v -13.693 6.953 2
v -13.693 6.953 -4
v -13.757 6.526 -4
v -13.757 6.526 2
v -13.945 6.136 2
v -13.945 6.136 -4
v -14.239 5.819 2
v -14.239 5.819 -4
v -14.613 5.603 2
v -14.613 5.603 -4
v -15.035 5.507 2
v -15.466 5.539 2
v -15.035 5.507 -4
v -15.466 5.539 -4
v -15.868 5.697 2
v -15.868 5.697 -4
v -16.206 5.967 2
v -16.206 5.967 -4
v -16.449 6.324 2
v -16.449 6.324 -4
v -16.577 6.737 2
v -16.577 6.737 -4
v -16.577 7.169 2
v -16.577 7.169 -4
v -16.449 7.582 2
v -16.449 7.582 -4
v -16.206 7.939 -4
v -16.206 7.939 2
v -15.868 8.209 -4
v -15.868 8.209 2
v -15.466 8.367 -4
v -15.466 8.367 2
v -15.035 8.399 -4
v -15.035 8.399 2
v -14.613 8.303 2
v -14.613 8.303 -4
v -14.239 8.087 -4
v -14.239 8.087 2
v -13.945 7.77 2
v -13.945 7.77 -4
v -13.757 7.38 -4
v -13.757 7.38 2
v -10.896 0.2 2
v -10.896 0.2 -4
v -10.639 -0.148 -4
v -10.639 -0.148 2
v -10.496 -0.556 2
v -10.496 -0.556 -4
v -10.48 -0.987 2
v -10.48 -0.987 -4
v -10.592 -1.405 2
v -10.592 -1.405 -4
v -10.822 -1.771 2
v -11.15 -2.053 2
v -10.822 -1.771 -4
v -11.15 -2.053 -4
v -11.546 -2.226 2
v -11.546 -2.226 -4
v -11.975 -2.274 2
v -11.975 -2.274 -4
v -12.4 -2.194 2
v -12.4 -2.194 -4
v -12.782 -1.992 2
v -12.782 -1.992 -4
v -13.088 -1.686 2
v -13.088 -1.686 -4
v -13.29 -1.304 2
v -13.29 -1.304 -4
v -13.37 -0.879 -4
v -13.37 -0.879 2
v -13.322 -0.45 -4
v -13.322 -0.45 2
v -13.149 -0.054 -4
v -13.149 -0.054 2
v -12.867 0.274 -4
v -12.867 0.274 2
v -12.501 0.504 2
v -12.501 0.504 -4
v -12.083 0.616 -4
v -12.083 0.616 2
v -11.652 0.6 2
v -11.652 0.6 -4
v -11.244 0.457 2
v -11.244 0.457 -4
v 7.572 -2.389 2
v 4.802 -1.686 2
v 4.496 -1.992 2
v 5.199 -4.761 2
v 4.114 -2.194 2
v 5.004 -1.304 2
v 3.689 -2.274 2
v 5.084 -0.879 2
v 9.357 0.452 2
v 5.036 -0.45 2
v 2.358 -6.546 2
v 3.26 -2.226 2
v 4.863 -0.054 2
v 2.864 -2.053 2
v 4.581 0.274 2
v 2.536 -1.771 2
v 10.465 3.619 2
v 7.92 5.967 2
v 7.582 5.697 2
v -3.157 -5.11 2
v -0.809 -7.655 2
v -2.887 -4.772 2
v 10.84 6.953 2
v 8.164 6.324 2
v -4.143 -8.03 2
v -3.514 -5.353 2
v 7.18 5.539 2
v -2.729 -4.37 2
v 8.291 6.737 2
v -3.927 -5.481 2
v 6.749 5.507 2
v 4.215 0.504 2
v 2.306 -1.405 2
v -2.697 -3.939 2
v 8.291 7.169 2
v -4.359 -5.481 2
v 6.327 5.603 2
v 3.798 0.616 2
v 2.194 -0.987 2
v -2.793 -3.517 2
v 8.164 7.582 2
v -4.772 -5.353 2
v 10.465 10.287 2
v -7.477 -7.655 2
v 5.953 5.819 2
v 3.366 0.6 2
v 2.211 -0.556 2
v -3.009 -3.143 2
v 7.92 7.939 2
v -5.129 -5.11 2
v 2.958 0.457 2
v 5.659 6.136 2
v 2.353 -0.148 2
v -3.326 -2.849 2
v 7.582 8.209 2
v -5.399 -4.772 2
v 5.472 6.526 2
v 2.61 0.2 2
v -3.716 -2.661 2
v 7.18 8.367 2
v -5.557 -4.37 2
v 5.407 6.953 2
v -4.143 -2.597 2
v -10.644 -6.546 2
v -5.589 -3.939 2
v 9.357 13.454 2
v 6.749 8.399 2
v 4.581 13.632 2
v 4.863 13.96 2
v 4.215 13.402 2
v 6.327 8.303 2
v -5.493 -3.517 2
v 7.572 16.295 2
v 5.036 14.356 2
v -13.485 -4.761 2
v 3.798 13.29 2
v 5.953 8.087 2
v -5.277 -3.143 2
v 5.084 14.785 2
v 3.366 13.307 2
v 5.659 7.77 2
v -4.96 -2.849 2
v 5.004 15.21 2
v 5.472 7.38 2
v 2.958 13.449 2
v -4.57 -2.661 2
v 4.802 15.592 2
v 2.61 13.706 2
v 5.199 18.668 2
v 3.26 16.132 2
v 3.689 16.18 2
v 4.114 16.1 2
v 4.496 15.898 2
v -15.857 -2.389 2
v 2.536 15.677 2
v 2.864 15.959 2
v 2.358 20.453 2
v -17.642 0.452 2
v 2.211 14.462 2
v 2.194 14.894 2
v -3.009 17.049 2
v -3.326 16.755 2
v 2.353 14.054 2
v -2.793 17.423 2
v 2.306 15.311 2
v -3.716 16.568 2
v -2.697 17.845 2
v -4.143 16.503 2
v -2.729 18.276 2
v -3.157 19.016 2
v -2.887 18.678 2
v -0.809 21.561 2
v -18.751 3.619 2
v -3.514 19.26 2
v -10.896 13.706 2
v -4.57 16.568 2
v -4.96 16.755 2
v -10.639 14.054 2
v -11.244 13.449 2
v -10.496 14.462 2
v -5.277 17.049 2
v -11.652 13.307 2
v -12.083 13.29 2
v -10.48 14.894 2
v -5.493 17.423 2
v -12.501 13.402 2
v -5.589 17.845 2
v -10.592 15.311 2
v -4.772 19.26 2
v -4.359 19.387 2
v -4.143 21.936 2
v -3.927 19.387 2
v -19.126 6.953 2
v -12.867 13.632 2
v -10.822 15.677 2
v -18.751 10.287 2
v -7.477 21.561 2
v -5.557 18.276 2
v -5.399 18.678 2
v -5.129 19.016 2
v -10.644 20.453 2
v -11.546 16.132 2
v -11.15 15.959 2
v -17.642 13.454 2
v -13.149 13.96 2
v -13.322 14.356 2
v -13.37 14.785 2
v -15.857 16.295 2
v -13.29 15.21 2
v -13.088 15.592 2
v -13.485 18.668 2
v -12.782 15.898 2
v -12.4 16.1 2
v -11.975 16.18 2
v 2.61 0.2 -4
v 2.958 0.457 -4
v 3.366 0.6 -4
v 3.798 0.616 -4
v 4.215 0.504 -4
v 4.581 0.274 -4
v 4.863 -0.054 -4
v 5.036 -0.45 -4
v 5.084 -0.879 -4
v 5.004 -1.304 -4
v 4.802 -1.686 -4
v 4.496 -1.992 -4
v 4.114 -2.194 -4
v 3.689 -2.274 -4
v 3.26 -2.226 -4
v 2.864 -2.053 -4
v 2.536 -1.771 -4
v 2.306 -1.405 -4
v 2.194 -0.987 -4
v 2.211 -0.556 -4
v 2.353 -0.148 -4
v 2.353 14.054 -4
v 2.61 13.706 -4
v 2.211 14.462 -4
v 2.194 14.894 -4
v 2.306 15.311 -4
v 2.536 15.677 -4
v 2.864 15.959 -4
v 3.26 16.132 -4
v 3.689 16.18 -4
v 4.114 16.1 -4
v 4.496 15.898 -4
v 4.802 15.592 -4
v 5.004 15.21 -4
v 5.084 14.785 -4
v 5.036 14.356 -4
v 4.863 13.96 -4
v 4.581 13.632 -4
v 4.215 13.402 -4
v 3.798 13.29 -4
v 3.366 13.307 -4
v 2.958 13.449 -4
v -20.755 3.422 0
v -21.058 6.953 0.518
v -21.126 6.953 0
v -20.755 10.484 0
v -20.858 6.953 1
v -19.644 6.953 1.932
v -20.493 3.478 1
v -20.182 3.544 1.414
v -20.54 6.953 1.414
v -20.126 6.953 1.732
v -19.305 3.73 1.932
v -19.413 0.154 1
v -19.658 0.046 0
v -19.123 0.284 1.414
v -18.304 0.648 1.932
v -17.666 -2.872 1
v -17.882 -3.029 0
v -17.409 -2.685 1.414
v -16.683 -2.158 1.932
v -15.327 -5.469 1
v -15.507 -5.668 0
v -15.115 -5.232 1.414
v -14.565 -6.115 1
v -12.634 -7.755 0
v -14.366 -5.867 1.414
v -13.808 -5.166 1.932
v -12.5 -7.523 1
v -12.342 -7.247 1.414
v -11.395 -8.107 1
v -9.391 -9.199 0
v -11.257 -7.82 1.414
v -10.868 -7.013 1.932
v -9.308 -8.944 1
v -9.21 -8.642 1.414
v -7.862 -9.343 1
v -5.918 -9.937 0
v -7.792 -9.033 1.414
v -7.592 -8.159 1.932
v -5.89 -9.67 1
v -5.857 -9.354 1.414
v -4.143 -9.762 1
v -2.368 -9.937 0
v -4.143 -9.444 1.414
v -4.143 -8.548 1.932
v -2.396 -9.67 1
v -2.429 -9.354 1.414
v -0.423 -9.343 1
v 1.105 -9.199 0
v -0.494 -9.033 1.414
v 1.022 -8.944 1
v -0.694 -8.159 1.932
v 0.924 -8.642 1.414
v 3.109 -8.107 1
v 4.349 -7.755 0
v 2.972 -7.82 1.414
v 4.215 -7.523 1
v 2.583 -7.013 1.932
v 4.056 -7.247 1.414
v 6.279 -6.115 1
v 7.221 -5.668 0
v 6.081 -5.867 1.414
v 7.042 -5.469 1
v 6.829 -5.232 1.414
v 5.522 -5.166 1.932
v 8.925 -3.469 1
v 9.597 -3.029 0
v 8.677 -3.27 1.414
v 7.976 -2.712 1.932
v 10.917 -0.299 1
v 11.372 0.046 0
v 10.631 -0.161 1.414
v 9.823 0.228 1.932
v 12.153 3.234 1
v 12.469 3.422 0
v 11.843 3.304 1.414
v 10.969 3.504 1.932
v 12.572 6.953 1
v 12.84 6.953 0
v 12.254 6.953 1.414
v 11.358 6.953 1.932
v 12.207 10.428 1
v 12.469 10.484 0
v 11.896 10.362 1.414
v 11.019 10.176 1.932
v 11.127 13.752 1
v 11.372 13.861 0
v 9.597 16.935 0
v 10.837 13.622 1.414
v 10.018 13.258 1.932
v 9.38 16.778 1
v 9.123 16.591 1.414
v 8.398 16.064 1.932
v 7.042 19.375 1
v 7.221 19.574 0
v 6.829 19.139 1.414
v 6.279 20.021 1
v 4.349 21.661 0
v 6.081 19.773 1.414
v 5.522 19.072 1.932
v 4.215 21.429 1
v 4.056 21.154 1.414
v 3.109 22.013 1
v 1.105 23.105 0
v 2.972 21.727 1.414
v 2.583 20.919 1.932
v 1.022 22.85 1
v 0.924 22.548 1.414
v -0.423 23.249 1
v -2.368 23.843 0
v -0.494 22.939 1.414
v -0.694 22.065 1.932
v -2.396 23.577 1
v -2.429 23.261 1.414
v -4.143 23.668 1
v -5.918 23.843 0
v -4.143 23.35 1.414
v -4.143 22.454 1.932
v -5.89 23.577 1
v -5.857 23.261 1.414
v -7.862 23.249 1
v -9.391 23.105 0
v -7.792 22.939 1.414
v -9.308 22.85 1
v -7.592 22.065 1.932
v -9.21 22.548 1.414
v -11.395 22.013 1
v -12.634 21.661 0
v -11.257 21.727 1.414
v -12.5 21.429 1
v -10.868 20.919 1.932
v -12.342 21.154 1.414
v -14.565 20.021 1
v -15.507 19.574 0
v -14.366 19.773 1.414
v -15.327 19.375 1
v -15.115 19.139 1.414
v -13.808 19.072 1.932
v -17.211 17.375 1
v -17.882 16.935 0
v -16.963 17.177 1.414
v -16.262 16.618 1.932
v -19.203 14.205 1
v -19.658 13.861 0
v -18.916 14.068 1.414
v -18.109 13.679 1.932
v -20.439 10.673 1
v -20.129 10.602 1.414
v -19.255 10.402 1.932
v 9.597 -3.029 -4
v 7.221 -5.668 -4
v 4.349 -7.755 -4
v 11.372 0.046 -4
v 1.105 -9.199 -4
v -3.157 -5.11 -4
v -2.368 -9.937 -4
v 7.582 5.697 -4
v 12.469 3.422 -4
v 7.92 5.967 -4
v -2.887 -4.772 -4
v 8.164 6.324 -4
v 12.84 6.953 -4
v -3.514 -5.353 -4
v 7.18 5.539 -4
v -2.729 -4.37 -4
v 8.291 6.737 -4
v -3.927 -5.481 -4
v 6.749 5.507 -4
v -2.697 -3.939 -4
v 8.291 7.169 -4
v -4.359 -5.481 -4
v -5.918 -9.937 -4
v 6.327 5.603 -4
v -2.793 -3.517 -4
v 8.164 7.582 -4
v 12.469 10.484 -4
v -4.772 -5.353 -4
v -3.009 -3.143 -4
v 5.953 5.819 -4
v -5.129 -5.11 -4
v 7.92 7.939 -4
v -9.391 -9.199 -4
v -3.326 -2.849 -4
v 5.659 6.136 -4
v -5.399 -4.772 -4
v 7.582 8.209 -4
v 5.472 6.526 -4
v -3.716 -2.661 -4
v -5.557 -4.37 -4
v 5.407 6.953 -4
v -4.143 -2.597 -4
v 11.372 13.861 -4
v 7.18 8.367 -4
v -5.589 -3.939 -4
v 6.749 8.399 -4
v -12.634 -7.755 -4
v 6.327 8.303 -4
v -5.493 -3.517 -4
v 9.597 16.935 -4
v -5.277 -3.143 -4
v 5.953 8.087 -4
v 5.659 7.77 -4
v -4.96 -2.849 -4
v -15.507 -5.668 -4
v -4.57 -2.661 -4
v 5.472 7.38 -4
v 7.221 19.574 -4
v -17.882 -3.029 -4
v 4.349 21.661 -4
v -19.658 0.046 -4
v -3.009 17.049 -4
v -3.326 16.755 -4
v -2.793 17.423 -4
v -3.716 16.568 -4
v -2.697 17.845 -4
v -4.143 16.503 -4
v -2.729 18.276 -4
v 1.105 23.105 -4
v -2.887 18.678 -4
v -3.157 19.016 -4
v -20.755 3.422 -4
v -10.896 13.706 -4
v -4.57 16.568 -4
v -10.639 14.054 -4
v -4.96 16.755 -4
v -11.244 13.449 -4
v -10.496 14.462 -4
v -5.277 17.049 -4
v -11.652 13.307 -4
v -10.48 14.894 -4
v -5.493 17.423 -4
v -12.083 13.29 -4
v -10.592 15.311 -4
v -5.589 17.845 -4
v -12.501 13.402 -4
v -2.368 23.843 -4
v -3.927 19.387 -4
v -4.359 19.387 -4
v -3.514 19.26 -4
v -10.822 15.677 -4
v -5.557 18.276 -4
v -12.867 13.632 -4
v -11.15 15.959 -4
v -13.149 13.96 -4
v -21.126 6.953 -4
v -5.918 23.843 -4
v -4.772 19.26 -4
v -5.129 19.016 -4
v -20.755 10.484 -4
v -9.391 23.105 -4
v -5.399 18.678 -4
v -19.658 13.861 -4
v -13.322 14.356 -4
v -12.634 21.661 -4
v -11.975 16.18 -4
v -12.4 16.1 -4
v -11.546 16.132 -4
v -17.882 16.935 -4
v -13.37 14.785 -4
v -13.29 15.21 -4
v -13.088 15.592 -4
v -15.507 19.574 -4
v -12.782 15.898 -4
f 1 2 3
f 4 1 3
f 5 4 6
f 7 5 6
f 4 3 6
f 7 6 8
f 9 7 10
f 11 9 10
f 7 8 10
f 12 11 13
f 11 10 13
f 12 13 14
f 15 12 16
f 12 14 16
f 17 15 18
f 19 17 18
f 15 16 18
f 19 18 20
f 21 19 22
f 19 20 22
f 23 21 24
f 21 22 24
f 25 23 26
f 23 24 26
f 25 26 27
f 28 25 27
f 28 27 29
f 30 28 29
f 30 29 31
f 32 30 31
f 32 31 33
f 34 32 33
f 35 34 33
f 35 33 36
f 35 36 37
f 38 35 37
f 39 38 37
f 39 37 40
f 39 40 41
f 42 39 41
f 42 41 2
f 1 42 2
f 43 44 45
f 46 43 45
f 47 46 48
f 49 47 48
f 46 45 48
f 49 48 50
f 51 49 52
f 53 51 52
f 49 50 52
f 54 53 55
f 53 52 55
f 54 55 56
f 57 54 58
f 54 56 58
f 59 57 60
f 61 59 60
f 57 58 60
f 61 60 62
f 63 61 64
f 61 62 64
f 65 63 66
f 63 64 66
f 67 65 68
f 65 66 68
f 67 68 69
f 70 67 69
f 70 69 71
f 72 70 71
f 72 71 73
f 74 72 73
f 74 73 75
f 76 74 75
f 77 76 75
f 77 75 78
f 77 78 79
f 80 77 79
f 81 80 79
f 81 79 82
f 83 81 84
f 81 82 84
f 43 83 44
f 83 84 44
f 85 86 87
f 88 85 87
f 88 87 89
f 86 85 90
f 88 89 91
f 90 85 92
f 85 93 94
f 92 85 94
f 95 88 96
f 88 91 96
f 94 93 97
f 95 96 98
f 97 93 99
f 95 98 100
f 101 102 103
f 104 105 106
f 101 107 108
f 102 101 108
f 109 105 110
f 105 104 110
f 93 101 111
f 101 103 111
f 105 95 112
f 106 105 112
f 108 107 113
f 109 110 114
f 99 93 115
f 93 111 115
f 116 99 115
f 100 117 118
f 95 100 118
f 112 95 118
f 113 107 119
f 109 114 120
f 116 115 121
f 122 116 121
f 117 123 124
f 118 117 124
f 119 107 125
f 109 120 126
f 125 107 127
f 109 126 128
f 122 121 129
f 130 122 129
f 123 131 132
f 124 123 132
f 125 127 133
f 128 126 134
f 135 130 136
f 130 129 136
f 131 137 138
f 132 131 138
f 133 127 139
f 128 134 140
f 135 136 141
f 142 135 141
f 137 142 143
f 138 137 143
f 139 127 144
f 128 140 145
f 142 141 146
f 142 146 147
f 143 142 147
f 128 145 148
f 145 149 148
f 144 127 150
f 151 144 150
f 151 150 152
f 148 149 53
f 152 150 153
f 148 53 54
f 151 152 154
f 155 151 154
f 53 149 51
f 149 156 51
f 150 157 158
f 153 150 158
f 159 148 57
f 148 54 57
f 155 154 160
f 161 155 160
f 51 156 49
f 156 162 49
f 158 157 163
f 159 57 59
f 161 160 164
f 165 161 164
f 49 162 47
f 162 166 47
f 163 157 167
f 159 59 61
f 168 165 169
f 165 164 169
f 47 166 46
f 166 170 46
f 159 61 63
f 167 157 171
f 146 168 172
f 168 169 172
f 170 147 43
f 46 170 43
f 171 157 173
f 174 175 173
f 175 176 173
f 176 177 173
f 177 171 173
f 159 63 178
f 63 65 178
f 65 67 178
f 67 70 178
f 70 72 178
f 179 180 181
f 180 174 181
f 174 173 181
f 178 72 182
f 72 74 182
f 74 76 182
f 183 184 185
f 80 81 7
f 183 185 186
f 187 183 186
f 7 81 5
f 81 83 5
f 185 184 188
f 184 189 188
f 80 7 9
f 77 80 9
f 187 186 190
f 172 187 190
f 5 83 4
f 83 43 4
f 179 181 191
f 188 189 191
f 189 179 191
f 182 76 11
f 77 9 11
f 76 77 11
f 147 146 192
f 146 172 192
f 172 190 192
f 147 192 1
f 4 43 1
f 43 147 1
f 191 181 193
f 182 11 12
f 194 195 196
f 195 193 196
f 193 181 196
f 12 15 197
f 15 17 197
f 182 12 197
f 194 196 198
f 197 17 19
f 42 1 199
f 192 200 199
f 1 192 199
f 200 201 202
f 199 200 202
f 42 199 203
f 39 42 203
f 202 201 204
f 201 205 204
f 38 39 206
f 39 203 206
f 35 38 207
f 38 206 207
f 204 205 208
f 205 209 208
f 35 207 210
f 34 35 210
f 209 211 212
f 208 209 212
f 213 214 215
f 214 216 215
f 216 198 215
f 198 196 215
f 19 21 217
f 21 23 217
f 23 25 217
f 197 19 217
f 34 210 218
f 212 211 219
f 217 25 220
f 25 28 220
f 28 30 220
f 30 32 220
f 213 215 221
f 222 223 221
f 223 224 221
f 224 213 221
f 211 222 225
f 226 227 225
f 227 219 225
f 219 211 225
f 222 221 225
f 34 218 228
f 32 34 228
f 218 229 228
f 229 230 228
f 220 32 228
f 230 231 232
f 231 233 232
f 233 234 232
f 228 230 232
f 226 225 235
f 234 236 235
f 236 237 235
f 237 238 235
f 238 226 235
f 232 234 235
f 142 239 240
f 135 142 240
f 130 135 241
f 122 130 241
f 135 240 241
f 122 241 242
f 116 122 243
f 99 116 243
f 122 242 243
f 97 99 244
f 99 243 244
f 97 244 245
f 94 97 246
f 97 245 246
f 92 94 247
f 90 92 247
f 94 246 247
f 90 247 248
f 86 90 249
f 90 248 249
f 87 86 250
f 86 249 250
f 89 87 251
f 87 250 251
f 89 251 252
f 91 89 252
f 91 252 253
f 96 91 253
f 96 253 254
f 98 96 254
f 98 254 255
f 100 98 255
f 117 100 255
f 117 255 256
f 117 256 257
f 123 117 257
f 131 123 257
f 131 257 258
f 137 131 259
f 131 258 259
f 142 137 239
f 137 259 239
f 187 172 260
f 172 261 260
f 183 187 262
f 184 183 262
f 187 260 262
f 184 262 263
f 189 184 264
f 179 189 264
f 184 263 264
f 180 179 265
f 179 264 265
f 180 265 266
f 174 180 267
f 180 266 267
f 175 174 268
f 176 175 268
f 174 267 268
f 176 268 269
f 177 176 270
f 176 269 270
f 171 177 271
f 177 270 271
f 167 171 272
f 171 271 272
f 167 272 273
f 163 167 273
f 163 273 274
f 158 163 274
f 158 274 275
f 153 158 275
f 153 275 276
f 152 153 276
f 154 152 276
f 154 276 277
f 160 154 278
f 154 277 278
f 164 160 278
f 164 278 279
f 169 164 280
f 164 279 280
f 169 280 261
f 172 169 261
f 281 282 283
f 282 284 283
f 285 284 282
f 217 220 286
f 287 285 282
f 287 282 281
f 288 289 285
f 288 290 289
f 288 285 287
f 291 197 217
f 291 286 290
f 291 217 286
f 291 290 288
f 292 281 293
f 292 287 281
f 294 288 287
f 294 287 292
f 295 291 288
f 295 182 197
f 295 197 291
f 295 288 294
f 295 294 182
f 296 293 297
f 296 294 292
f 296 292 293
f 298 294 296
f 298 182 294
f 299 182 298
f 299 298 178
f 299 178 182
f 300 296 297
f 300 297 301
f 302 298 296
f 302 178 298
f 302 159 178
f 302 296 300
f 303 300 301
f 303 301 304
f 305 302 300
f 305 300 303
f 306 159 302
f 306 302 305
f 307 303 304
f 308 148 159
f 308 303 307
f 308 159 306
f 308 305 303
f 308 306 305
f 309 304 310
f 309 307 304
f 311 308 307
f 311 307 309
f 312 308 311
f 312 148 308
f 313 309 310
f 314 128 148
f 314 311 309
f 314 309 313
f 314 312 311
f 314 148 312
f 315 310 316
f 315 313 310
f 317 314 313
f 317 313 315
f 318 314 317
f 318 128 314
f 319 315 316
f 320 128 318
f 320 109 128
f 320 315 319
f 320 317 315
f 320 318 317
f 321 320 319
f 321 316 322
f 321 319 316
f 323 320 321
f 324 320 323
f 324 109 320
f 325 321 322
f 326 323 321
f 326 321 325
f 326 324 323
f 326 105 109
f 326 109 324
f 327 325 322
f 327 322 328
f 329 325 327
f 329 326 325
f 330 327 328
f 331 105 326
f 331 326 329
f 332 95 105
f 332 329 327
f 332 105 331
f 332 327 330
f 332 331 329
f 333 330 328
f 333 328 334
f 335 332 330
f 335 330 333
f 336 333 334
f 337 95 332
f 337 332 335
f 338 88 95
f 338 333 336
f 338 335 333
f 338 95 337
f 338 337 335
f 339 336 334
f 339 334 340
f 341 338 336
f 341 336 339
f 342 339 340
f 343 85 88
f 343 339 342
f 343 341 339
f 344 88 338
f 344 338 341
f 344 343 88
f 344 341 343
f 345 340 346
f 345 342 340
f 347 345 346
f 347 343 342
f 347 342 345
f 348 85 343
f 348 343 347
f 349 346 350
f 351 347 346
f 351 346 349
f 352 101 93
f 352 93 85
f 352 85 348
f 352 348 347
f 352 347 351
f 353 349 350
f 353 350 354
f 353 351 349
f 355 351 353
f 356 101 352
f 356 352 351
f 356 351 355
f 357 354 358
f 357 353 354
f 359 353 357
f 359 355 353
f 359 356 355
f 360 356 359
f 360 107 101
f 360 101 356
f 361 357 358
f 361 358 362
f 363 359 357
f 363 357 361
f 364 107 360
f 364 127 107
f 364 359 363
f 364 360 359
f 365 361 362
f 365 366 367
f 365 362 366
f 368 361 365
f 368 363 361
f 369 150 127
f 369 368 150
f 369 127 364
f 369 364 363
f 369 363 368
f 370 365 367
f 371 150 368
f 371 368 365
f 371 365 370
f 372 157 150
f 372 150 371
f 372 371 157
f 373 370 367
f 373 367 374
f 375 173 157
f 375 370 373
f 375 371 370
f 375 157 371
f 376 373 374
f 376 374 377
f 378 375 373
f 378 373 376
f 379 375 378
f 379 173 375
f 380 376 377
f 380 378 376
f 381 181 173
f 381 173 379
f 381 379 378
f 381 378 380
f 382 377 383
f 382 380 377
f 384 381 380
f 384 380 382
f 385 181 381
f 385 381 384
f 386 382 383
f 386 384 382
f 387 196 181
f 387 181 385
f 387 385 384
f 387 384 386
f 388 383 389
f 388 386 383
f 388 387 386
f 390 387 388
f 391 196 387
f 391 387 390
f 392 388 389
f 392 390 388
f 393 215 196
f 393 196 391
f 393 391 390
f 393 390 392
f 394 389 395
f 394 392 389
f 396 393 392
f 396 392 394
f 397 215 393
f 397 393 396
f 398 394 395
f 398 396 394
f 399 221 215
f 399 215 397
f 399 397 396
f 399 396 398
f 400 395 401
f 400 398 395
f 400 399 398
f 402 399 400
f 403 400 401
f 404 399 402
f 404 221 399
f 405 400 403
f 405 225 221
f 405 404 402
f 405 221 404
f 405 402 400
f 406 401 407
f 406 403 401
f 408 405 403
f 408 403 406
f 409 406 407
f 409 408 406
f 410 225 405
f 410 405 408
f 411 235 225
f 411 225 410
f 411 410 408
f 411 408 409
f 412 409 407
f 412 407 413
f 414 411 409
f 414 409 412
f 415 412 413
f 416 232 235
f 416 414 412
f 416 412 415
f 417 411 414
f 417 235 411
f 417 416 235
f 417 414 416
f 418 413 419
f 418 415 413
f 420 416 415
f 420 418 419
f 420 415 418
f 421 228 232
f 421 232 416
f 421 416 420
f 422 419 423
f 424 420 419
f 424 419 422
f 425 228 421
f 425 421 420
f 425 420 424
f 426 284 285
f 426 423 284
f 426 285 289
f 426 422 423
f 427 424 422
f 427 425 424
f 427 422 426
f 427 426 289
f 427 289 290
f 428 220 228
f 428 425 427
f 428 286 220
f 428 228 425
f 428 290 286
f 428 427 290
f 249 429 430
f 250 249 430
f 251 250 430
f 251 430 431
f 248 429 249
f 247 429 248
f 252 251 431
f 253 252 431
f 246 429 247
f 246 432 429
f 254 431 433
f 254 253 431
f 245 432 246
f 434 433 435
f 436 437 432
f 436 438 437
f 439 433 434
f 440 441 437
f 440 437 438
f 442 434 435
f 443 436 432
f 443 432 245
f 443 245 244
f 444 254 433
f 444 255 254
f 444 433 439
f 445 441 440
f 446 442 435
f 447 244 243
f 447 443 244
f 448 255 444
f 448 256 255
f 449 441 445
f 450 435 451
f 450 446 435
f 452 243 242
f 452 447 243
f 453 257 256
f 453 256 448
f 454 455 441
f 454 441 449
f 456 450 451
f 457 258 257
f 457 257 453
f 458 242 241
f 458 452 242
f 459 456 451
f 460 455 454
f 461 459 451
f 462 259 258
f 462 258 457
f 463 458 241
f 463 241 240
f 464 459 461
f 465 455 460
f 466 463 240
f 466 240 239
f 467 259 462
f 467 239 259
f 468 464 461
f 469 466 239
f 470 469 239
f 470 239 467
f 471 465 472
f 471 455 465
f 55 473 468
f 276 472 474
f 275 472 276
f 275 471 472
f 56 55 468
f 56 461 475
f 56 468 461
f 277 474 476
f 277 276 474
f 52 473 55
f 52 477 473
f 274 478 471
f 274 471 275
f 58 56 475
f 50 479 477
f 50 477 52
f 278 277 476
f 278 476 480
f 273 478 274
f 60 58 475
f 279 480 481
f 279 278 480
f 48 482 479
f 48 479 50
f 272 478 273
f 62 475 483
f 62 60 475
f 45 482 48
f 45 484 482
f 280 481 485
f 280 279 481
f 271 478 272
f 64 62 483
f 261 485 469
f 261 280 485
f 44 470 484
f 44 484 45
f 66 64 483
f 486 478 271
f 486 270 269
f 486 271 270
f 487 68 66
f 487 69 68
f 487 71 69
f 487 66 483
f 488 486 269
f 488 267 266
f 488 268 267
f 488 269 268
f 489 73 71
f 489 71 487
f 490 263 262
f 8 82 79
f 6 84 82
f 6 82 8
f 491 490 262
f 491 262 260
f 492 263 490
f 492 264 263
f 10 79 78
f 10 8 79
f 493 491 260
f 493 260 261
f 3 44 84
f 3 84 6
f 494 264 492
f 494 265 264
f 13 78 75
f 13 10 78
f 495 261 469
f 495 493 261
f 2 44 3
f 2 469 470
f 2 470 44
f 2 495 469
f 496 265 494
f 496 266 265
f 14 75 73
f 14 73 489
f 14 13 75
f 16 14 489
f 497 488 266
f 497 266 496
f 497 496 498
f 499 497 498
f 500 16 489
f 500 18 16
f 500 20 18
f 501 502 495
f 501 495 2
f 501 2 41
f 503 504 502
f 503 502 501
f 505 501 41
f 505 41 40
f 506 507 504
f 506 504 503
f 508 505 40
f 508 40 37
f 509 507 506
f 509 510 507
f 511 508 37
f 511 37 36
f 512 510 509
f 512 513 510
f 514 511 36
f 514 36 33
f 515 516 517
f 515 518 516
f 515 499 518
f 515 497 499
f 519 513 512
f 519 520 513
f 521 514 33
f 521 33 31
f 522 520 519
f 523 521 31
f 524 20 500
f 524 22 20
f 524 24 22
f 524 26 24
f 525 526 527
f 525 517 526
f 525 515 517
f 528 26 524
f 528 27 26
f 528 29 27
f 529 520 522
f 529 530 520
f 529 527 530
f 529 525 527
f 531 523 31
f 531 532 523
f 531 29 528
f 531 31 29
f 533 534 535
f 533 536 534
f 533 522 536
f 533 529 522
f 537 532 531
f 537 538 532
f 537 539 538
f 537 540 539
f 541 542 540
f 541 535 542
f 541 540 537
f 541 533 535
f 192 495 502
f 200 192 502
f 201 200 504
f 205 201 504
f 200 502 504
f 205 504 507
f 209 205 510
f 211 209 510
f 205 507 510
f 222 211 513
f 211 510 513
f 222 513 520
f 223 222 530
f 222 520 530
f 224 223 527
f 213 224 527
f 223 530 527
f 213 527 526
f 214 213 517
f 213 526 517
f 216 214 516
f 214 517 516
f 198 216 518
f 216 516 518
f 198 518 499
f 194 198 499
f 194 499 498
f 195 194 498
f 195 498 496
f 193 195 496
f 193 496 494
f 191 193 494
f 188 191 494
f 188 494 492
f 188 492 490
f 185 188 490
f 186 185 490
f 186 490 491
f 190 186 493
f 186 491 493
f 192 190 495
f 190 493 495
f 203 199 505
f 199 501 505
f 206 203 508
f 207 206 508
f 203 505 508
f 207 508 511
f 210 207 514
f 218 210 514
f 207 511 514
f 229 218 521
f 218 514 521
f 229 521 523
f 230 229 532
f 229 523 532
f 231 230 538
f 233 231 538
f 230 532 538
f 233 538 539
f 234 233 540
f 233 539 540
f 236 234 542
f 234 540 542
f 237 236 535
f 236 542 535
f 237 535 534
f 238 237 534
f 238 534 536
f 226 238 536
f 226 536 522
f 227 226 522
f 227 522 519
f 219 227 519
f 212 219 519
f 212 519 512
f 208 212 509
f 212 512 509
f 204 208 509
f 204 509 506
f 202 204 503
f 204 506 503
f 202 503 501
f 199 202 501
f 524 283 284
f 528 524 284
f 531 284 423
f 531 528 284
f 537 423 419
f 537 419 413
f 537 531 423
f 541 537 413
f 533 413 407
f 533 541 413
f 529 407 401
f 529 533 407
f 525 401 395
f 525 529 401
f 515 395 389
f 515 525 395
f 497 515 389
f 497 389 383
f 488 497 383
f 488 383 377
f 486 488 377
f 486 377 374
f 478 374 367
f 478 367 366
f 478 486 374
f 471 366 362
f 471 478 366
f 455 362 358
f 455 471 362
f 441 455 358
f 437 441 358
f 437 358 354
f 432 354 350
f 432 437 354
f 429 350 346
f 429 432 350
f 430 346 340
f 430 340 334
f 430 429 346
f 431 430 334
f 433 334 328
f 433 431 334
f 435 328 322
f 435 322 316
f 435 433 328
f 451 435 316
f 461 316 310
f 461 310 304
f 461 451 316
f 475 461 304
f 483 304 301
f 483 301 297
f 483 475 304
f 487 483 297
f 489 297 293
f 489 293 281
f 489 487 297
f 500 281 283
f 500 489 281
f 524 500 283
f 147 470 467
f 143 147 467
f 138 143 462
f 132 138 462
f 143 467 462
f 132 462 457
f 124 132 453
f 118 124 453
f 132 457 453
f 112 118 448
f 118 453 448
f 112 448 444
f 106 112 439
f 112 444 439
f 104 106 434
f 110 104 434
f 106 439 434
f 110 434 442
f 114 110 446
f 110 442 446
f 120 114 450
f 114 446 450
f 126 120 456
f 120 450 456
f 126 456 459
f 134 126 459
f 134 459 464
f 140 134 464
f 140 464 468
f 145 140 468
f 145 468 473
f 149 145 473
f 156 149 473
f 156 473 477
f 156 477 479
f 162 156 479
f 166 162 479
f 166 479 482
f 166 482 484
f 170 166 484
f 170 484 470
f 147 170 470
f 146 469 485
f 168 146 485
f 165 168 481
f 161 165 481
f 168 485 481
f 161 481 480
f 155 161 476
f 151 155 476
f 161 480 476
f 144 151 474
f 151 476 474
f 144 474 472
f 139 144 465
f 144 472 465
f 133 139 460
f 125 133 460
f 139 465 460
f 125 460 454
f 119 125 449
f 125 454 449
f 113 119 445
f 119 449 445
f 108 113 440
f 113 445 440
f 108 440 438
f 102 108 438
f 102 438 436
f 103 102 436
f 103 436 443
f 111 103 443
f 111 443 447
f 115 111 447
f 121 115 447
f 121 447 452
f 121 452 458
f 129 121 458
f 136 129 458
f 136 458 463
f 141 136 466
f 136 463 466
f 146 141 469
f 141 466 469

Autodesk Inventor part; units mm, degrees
ref_plane "YZ Plane" through (0, 0, 0) normal (1, 0, 0) x (0, 1, 0)
ref_plane "XZ Plane" through (0, 0, 0) normal (0, 1, 0) x (-1, 0, 0)
ref_plane "XY Plane" through (0, 0, 0) normal (0, 0, 1) x (1, 0, 0)
sketch "Skizze1" plane through (-4.3917, 11.7982, 0) normal (0, 0, -1) x (-1, 0, 0)
  circle A0 centre (-0.2488, -4.8451) radius 16.9829
  point P0 (-4.3917, -11.7982)
extrude "Extrusion1" add sketch "Skizze1" along normal blind 4 and the other way blind 2
fillet "Rundung1" radius 2 1 edges at (12.8401, 6.9531, 2)
sketch "Skizze2" plane through (-4.1429, 6.9531, 2) normal (0, 0, 1) x (1, 0, 0)
  circle A0 centre (0, 0) radius 14.9829 construction
  point P0 (4.1429, -6.9531)
  point P1 (0, 11)
  dimension "d5" = 11
hole "Bohrung1" at (-4.1429, 17.9531, 2) direction (0, 0, -1) diameter 2.9 end through all clearance for "Inbusschraube ISO 4762" size "M2.5" standard "ISO"
pattern_circular "Runde Anordnung1" count 8 over 360 about axis through (-4.1429, 6.9531, 0) along (0, 0, -1) of "Bohrung1"
properties part number "Pointing_Finger"
